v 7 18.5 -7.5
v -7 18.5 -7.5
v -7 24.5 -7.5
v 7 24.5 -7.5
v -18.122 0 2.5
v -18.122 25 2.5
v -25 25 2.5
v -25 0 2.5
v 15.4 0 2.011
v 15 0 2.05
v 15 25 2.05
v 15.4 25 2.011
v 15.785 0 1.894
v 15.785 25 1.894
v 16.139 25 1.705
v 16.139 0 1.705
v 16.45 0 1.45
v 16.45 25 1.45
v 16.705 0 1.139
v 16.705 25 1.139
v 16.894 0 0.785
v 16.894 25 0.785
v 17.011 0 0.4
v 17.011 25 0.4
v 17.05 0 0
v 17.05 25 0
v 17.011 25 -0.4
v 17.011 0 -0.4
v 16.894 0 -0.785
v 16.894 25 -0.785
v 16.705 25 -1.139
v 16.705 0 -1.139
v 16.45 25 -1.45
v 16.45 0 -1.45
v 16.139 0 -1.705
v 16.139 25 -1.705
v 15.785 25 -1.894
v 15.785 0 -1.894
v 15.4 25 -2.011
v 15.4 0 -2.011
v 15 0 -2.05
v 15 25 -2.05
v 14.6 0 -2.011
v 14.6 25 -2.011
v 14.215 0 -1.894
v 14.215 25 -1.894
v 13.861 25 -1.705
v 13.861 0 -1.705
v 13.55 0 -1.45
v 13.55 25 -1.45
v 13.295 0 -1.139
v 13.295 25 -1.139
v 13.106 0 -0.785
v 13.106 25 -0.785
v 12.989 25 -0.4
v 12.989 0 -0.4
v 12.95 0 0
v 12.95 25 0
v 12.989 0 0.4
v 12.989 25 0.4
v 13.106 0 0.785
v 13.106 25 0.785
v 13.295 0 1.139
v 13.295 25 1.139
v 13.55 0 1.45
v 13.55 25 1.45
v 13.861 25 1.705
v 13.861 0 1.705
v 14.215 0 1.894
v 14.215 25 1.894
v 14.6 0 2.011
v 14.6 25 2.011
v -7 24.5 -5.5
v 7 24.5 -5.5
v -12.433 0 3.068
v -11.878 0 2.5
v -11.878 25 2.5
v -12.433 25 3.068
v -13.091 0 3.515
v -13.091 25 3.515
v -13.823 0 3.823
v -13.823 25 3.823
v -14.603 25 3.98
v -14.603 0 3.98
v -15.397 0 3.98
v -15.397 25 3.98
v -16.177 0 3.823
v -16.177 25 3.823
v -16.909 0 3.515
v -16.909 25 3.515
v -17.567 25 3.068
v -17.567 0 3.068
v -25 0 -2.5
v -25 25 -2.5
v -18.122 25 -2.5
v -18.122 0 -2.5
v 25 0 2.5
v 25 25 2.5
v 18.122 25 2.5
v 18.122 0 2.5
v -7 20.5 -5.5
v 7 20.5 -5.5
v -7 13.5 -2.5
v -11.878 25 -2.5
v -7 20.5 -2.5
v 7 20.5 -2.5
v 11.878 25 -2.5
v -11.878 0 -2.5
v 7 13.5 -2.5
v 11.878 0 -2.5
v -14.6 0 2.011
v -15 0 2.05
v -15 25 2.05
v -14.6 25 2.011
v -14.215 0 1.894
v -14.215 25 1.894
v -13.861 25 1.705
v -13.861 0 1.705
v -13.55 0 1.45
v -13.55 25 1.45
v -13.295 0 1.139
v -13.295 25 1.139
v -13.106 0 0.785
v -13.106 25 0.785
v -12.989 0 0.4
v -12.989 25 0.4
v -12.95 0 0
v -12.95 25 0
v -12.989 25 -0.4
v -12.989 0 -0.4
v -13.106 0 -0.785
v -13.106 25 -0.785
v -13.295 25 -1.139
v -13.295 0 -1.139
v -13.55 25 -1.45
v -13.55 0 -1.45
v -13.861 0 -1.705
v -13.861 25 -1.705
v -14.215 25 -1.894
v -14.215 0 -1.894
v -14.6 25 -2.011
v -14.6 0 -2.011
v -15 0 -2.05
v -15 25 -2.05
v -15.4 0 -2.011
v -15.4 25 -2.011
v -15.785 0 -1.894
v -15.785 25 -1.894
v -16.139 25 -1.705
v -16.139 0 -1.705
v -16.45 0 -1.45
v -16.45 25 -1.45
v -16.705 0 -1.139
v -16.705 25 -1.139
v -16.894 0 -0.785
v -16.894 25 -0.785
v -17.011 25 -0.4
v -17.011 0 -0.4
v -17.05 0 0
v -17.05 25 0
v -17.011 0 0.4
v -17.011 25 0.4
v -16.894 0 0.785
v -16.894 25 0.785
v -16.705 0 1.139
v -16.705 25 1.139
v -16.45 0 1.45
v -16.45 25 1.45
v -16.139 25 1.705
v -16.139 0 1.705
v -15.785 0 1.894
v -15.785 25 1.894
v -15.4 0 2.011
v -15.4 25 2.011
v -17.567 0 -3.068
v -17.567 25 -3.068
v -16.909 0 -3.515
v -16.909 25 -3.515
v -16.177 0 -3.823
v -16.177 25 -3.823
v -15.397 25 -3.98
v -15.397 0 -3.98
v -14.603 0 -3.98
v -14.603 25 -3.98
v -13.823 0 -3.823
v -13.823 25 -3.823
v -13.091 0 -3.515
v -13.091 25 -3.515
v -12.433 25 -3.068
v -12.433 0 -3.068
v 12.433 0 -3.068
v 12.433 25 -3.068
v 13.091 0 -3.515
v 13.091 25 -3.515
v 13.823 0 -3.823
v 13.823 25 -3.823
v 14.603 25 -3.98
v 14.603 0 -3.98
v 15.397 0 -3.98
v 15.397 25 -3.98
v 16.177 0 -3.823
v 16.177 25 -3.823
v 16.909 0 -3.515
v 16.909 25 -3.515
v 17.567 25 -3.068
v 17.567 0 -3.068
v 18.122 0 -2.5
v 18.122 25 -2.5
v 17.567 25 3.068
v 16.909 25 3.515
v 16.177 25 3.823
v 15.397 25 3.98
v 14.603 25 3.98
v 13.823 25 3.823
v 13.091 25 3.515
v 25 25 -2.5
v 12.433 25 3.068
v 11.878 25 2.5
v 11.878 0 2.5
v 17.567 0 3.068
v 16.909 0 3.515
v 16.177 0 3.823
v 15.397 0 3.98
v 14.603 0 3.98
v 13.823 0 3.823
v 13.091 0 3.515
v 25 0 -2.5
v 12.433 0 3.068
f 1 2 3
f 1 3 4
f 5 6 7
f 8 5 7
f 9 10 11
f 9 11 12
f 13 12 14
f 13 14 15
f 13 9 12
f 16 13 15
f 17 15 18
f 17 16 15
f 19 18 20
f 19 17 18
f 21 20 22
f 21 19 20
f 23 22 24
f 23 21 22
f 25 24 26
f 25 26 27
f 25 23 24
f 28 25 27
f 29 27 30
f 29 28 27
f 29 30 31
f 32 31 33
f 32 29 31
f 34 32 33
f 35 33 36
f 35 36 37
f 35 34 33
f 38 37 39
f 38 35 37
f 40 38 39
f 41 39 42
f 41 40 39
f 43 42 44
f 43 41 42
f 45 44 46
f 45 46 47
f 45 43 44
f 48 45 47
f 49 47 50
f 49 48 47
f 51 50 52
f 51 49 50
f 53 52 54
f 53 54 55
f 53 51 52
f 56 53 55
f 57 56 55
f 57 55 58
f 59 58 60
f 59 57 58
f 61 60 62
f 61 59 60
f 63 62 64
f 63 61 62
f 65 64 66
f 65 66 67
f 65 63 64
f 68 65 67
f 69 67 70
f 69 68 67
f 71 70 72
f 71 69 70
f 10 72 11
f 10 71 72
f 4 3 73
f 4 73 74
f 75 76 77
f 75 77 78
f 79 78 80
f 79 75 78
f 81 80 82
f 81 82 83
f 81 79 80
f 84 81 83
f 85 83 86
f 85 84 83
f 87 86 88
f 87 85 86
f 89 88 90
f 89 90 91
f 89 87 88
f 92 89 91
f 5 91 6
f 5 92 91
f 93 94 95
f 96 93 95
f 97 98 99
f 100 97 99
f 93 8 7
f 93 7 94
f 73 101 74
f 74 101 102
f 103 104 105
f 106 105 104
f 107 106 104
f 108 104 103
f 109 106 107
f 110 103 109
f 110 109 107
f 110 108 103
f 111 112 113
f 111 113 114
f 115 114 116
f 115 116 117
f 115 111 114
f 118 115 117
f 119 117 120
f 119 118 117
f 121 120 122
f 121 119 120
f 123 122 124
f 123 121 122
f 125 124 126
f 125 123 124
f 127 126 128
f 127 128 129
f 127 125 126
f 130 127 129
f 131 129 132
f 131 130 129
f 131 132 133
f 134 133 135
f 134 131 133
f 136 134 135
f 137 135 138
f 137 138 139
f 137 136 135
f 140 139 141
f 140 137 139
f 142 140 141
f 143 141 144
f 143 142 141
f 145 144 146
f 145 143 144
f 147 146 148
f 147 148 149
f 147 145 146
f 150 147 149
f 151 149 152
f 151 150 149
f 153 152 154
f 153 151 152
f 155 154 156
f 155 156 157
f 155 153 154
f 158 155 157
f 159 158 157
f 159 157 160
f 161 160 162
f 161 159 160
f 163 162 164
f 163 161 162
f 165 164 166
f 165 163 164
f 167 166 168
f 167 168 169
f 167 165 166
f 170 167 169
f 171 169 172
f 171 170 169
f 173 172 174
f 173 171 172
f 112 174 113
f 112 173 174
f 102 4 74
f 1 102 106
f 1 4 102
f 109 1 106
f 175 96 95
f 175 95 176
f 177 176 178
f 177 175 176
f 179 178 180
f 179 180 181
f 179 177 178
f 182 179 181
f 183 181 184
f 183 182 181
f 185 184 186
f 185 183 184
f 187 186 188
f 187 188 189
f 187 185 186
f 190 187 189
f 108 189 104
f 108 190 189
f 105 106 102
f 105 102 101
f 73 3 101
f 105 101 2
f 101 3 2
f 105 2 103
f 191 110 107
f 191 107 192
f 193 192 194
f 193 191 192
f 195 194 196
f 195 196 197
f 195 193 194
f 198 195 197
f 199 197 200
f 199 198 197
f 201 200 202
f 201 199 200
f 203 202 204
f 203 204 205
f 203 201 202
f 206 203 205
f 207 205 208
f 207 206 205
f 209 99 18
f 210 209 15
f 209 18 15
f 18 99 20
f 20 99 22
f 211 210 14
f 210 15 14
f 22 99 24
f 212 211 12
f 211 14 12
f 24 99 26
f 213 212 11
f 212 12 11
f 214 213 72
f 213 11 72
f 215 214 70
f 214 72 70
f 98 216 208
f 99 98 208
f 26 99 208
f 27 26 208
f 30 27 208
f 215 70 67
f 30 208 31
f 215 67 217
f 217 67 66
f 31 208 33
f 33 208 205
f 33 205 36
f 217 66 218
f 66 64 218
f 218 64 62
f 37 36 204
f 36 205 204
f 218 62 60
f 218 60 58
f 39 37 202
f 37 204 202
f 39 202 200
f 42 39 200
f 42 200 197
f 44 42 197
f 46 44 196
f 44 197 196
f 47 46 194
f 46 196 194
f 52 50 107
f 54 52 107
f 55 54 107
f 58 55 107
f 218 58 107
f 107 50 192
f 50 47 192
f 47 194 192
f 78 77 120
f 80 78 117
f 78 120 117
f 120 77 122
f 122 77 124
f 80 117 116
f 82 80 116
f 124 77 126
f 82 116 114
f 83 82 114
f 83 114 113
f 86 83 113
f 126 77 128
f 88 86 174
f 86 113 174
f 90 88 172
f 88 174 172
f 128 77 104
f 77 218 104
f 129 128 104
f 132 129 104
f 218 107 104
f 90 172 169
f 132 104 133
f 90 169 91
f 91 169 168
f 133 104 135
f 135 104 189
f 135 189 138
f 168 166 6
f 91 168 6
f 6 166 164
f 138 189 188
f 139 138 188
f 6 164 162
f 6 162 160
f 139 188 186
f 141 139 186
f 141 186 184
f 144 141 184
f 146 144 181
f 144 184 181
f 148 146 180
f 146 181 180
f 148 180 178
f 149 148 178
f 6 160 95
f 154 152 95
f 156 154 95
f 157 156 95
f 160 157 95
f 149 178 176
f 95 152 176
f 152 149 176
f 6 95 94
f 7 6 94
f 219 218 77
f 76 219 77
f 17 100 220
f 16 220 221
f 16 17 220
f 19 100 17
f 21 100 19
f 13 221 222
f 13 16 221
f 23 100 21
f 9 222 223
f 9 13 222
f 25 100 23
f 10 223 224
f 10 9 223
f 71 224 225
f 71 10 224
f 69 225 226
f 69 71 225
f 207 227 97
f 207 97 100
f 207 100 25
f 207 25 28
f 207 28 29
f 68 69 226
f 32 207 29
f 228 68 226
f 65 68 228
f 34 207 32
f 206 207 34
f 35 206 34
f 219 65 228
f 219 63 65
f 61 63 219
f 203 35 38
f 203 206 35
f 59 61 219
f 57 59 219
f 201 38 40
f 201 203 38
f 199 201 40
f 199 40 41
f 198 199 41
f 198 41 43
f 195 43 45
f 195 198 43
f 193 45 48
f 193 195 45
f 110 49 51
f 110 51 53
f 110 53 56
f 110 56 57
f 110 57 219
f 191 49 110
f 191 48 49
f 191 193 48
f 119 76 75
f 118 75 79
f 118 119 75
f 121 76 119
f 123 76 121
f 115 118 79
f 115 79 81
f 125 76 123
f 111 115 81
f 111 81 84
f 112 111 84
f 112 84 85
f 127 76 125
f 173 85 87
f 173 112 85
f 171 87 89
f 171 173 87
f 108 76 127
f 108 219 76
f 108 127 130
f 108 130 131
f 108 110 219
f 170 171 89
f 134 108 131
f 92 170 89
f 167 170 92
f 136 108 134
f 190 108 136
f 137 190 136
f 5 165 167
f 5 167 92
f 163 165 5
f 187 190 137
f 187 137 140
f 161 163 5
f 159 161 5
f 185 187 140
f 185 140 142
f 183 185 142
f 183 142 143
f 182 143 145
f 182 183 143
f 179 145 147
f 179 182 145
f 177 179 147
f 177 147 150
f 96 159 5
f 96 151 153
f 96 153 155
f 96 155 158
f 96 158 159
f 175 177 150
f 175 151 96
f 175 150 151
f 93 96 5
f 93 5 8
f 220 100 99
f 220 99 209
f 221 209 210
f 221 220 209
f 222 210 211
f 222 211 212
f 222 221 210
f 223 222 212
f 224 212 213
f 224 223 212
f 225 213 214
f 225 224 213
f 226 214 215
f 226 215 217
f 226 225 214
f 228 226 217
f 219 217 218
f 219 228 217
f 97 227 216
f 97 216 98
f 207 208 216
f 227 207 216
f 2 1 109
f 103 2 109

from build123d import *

# Parameters (mm, degrees)
SKETCH1_R           = 2.05
BOSS_EXTRUDE1_DEPTH = 25
SKETCH2_W           = 14
SKETCH2_H           = 2
BOSS_EXTRUDE2_DEPTH = 5
SKETCH3_W           = 14
SKETCH3_H           = 2
BOSS_EXTRUDE3_DEPTH = 4
RIB3_REACH          = 43.295
SKETCH4_WALL_W      = 91.660413372
SKETCH4_WALL_H      = 14


with BuildPart() as part:
    # Sketch1 → Boss-Extrude1 (new body)
    with BuildSketch(Plane(origin=(0, 0, 0), x_dir=(1, 0, 0), z_dir=(0, 1, 0))):
        with BuildLine():
            Line((-25, 2.5), (-18.122498999, 2.5))
            ThreePointArc((-18.122498999, 2.5), (-15, 4), (-11.877501001, 2.5))
            Line((-11.877501001, 2.5), (11.877501001, 2.5))
            ThreePointArc((11.877501001, 2.5), (15, 4), (18.122498999, 2.5))
            Line((18.122498999, 2.5), (25, 2.5))
            Line((25, 2.5), (25, -2.5))
            Line((25, -2.5), (18.122498999, -2.5))
            ThreePointArc((18.122498999, -2.5), (15, -4), (11.877501001, -2.5))
            Line((11.877501001, -2.5), (-11.877501001, -2.5))
            ThreePointArc((-11.877501001, -2.5), (-15, -4), (-18.122498999, -2.5))
            Line((-18.122498999, -2.5), (-25, -2.5))
            Line((-25, -2.5), (-25, 2.5))
        make_face()
        with Locations(Location((-15, 0, 0), (0, 0, 270))):
            Circle(SKETCH1_R, mode=Mode.SUBTRACT)
        with Locations(Location((15, 0, 0), (0, 0, 270))):
            Circle(SKETCH1_R, mode=Mode.SUBTRACT)
    extrude(amount=BOSS_EXTRUDE1_DEPTH)

    # Sketch2 → Boss-Extrude2 (add)
    with BuildSketch(Plane(origin=(0, 0, -2.5), x_dir=(-1, 0, 0), z_dir=(0, 0, -1))):
        with Locations((0, 19.5)):
            Rectangle(SKETCH2_W, SKETCH2_H)
    extrude(amount=BOSS_EXTRUDE2_DEPTH)

    # Sketch3 → Boss-Extrude3 (add)
    with BuildSketch(Plane(origin=(0, 20.5, 0), x_dir=(1, 0, 0), z_dir=(0, 1, 0))):
        with Locations((0, 6.5)):
            Rectangle(SKETCH3_W, SKETCH3_H)
    extrude(amount=BOSS_EXTRUDE3_DEPTH)

    # Sketch4 wall → Rib3 (add, up to next)
    with BuildSketch(Plane(origin=(-7, 16, -5), x_dir=(0, -0.707106781187, 0.707106781187), z_dir=(0, 0.707106781187, 0.707106781187)), mode=Mode.PRIVATE) as rib3_sk1:
        with Locations((0, 7)):
            Rectangle(SKETCH4_WALL_W, SKETCH4_WALL_H)
    rib3_tool1 = extrude(rib3_sk1.sketch, amount=RIB3_REACH, mode=Mode.PRIVATE) - part.part
    add(rib3_tool1.solids().sort_by_distance((-7, 16, -5))[0])


solid = part.part
